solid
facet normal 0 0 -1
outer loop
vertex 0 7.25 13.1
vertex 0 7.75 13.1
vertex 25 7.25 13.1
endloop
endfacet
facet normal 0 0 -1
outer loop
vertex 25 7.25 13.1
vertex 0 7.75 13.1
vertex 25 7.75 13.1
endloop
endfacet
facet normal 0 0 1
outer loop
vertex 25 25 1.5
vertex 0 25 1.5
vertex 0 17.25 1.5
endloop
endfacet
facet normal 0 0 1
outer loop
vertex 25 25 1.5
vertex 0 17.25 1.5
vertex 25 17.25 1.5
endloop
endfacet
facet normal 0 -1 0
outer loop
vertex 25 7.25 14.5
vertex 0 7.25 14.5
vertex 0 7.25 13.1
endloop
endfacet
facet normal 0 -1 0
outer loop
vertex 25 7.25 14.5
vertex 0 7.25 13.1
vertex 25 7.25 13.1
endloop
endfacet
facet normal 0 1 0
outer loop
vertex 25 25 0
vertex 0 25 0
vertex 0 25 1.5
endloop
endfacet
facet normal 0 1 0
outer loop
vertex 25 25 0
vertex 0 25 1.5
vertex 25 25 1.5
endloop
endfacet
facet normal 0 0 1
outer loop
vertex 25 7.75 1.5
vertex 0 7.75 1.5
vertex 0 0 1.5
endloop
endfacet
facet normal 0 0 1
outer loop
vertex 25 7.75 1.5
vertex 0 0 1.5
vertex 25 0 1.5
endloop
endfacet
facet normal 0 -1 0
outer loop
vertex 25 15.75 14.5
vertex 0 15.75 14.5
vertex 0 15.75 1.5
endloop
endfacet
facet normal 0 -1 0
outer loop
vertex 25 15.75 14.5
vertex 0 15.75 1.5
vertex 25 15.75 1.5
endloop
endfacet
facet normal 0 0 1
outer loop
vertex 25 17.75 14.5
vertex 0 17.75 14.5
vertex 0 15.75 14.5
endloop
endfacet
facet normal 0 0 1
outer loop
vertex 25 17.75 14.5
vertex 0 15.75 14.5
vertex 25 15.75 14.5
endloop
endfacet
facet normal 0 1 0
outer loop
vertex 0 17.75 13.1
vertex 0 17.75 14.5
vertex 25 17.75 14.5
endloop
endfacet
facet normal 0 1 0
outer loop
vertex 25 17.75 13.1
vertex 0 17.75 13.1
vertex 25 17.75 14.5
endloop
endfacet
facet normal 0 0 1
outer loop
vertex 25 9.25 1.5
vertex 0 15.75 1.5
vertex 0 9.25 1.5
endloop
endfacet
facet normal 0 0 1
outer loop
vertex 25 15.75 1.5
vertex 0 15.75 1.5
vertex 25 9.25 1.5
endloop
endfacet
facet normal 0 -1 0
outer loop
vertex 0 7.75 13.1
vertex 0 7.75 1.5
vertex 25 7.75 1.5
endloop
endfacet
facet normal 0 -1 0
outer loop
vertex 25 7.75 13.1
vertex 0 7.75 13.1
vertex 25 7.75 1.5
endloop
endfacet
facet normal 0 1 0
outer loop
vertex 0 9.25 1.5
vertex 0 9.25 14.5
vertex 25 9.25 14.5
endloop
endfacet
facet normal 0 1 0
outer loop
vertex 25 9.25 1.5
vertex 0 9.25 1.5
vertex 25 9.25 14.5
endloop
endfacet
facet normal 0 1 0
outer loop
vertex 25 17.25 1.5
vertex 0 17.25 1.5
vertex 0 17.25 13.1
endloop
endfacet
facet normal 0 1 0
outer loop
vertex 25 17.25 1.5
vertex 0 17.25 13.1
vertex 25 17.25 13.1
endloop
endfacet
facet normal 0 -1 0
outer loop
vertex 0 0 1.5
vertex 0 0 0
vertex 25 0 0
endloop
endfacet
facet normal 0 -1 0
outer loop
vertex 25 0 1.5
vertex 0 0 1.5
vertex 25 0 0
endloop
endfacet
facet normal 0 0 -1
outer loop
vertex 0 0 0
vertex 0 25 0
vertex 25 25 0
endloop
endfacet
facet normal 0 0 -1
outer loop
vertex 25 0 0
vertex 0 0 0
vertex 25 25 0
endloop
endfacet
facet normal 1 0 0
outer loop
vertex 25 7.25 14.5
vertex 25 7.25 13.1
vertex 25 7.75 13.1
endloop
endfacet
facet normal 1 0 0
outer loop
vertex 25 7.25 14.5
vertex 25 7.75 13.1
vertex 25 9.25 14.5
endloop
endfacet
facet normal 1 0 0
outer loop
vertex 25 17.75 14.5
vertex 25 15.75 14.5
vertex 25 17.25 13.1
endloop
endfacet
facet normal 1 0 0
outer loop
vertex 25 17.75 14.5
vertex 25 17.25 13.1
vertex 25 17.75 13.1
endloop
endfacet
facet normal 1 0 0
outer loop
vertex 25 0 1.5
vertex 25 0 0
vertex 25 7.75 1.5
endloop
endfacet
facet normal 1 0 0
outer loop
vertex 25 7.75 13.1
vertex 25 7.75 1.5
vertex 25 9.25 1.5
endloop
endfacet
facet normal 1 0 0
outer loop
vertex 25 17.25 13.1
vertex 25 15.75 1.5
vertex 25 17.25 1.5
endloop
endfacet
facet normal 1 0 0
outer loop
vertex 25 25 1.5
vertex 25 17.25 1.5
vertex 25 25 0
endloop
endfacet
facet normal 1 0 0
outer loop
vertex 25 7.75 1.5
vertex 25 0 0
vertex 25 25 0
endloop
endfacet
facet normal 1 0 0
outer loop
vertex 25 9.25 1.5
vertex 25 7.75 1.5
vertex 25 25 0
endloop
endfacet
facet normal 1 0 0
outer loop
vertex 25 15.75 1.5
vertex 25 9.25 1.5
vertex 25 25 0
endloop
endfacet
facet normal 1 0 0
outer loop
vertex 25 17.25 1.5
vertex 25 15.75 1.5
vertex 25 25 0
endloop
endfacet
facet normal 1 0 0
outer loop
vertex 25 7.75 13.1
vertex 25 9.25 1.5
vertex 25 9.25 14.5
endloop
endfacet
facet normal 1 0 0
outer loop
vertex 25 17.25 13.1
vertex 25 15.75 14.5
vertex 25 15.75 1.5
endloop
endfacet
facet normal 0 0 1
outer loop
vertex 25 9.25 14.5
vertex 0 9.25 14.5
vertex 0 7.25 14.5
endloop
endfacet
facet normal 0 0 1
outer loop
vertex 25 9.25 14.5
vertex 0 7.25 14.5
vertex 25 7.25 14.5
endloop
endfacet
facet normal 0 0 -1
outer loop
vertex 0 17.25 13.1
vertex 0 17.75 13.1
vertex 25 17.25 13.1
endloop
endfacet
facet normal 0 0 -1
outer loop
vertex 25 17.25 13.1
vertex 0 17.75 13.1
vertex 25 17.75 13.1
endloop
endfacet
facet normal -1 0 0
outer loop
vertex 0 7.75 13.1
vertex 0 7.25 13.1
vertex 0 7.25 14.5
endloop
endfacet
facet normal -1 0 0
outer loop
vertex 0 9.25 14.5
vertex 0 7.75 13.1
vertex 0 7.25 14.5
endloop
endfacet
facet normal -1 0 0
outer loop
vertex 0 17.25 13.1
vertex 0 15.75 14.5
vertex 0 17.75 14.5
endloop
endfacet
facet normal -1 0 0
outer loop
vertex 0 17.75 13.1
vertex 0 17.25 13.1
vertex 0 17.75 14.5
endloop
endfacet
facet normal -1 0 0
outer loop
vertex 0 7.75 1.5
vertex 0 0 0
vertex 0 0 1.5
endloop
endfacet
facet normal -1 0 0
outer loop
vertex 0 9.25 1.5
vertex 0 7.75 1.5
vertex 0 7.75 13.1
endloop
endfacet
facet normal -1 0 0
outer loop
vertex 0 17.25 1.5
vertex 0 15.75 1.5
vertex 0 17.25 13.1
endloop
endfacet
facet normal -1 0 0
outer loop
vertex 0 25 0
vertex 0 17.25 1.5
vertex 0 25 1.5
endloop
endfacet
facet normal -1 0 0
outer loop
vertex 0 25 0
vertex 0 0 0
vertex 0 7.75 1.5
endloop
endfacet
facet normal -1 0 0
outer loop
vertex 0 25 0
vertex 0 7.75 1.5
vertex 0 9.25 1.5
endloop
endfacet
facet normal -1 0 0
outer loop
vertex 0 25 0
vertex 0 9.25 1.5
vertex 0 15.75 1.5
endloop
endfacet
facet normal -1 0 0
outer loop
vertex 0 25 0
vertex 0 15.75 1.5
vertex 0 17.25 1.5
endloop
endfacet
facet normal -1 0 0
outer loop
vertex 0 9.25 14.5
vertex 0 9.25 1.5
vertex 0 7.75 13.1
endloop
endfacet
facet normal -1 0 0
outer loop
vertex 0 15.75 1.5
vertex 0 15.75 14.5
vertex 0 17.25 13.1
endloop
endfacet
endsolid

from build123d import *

# Parameters (mm, degrees)
SKETCH_1_W          = 25
SKETCH_1_H          = 25
EXTRUDE_1_DEPTH     = 14.5
SKETCH_2_W          = 25
SKETCH_2_H          = 7.25
SKETCH_2_H_2        = 6.5
CUT_EXTRUDE_1_DEPTH = 13
SKETCH_3_W          = 25
SKETCH_3_H          = 0.5
CUT_EXTRUDE_2_DEPTH = 11.6


with BuildPart() as part:
    # Эскиз1 → Бобышка-Вытянуть1 (new body)
    with BuildSketch(Plane.XY):
        with Locations((12.5, 12.5)):
            Rectangle(SKETCH_1_W, SKETCH_1_H)
    extrude(amount=EXTRUDE_1_DEPTH)

    # Эскиз2 → Вырез-Вытянуть1 (cut)
    with BuildSketch(Plane.XY.offset(14.5)):
        with Locations((12.5, 21.375)):
            Rectangle(SKETCH_2_W, SKETCH_2_H)
        with Locations((12.5, 12.5)):
            Rectangle(SKETCH_2_W, SKETCH_2_H_2)
        with Locations((12.5, 3.625)):
            Rectangle(SKETCH_2_W, SKETCH_2_H)
    extrude(amount=-CUT_EXTRUDE_1_DEPTH, mode=Mode.SUBTRACT)

    # Эскиз3 → Вырез-Вытянуть2 (cut)
    with BuildSketch(Plane.XY.offset(1.5)):
        with Locations((12.5, 17.5)):
            Rectangle(SKETCH_3_W, SKETCH_3_H)
        with Locations((12.5, 7.5)):
            Rectangle(SKETCH_3_W, SKETCH_3_H)
    extrude(amount=CUT_EXTRUDE_2_DEPTH, mode=Mode.SUBTRACT)


solid = part.part
